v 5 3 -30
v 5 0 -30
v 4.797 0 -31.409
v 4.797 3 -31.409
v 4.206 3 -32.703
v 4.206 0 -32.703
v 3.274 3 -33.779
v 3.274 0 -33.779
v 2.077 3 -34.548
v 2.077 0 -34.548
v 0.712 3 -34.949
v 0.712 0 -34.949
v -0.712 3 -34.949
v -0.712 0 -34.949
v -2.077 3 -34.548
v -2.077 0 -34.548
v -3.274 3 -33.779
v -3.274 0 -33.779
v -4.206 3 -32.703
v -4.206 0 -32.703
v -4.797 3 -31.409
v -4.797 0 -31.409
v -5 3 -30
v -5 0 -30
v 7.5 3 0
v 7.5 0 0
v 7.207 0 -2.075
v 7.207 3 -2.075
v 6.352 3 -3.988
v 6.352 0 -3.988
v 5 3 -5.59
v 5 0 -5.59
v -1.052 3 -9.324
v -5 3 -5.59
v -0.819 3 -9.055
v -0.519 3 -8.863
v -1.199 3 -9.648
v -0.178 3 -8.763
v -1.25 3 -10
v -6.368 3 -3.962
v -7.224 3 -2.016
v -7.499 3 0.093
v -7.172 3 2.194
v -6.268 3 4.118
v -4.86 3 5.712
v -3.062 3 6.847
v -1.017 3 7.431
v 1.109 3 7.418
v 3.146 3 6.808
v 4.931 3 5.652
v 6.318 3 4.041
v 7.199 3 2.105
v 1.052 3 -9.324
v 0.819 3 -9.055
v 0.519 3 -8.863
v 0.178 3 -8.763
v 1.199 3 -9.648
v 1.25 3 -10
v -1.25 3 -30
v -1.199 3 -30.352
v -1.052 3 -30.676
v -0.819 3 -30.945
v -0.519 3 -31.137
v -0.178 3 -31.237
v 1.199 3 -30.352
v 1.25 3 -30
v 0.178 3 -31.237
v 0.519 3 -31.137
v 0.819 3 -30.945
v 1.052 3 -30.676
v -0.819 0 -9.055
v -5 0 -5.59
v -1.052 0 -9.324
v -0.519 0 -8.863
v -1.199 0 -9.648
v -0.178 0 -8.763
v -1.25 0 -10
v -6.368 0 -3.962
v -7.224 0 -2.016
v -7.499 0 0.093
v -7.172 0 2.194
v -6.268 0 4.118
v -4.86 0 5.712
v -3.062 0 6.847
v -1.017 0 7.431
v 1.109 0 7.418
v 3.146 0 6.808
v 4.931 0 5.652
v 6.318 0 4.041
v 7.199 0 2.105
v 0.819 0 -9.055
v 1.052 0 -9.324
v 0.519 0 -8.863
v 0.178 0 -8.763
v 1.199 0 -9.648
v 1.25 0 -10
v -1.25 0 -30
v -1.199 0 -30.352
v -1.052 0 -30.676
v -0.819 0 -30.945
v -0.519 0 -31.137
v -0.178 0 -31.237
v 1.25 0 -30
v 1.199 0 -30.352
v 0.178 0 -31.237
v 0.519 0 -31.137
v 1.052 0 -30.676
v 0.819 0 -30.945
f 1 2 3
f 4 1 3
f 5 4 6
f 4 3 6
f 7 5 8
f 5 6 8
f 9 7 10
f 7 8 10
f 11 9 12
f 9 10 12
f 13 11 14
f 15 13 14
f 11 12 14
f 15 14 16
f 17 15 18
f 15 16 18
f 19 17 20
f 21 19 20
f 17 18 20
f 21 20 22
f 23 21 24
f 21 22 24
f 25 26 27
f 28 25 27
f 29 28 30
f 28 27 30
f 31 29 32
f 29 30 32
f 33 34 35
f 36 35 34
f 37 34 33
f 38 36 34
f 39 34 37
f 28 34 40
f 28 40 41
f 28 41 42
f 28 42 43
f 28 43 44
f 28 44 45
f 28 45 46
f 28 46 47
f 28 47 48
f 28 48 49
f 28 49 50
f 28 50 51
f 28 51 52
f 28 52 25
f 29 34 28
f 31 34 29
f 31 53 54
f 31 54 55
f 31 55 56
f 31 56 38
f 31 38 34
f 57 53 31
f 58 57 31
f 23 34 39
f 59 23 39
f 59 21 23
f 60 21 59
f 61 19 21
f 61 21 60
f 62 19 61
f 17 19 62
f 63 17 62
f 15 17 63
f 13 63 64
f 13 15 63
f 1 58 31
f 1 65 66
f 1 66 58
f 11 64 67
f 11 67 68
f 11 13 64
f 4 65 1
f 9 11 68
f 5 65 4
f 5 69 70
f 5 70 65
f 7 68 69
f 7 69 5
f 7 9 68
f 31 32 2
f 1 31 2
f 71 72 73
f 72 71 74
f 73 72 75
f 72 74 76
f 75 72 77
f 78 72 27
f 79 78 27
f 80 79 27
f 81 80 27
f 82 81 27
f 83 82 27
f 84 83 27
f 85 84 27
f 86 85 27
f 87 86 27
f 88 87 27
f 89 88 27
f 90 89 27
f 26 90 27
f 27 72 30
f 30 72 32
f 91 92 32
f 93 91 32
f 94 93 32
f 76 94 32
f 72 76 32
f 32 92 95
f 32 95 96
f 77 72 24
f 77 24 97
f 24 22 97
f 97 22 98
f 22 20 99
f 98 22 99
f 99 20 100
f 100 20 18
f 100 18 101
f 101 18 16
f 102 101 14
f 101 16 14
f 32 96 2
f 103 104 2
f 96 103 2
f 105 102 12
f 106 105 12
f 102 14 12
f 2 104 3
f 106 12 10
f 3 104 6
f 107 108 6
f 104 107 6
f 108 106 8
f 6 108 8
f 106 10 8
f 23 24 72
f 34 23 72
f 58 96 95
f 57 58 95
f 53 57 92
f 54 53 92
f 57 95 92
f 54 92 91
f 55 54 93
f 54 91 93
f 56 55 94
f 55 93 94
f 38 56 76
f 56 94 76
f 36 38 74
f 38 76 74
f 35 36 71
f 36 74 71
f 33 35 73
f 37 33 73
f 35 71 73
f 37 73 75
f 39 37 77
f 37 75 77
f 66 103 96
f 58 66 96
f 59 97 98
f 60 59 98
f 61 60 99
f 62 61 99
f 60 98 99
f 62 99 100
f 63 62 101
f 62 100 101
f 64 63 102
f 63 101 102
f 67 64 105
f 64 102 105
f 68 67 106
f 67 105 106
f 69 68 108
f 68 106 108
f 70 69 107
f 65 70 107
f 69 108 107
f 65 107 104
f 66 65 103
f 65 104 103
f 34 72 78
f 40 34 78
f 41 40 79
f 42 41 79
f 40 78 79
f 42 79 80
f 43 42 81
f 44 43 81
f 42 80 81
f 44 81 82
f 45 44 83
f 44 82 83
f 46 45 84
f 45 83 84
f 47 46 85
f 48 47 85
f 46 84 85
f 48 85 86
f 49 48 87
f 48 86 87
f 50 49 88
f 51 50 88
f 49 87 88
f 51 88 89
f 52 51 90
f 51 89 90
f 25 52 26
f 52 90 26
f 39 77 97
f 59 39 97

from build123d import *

# Parameters (mm, degrees)
BOSS_EXTRUDE1_DEPTH = 3


with BuildPart() as part:
    # Sketch1 → Boss-Extrude1 (new body)
    with BuildSketch(Plane(origin=(0, 0, 0), x_dir=(1, 0, 0), z_dir=(0, 1, 0))):
        with BuildLine():
            Line((-5, 30), (-5, 5.590169944))
            ThreePointArc((-5, 5.590169944), (0, 7.5), (5, 5.590169944))
            Line((5, 5.590169944), (5, 30))
            ThreePointArc((5, 30), (0, 35), (-5, 30))
        make_face()
        with BuildLine():
            ThreePointArc((-1.25, 30), (0, 31.25), (1.25, 30))
            Line((1.25, 30), (1.25, 10))
            ThreePointArc((1.25, 10), (0, 8.75), (-1.25, 10))
            Line((-1.25, 10), (-1.25, 30))
        make_face(mode=Mode.SUBTRACT)
        with BuildLine():
            ThreePointArc((5, 0), (0, -5), (-5, 0))
            Line((-5, 0), (-5, 5.590169944))
            ThreePointArc((-5, 5.590169944), (-3.061862178, -6.846531969), (7.5, 0))
            ThreePointArc((7.5, 0), (6.846531969, 3.061862178), (5, 5.590169944))
            Line((5, 5.590169944), (5, 0))
        make_face()
        with BuildLine():
            Line((-5, 5.590169944), (-5, 0))
            ThreePointArc((-5, 0), (0, -5), (5, 0))
            Line((5, 0), (5, 5.590169944))
            ThreePointArc((5, 5.590169944), (0, 7.5), (-5, 5.590169944))
        make_face()
    extrude(amount=BOSS_EXTRUDE1_DEPTH)


solid = part.part
